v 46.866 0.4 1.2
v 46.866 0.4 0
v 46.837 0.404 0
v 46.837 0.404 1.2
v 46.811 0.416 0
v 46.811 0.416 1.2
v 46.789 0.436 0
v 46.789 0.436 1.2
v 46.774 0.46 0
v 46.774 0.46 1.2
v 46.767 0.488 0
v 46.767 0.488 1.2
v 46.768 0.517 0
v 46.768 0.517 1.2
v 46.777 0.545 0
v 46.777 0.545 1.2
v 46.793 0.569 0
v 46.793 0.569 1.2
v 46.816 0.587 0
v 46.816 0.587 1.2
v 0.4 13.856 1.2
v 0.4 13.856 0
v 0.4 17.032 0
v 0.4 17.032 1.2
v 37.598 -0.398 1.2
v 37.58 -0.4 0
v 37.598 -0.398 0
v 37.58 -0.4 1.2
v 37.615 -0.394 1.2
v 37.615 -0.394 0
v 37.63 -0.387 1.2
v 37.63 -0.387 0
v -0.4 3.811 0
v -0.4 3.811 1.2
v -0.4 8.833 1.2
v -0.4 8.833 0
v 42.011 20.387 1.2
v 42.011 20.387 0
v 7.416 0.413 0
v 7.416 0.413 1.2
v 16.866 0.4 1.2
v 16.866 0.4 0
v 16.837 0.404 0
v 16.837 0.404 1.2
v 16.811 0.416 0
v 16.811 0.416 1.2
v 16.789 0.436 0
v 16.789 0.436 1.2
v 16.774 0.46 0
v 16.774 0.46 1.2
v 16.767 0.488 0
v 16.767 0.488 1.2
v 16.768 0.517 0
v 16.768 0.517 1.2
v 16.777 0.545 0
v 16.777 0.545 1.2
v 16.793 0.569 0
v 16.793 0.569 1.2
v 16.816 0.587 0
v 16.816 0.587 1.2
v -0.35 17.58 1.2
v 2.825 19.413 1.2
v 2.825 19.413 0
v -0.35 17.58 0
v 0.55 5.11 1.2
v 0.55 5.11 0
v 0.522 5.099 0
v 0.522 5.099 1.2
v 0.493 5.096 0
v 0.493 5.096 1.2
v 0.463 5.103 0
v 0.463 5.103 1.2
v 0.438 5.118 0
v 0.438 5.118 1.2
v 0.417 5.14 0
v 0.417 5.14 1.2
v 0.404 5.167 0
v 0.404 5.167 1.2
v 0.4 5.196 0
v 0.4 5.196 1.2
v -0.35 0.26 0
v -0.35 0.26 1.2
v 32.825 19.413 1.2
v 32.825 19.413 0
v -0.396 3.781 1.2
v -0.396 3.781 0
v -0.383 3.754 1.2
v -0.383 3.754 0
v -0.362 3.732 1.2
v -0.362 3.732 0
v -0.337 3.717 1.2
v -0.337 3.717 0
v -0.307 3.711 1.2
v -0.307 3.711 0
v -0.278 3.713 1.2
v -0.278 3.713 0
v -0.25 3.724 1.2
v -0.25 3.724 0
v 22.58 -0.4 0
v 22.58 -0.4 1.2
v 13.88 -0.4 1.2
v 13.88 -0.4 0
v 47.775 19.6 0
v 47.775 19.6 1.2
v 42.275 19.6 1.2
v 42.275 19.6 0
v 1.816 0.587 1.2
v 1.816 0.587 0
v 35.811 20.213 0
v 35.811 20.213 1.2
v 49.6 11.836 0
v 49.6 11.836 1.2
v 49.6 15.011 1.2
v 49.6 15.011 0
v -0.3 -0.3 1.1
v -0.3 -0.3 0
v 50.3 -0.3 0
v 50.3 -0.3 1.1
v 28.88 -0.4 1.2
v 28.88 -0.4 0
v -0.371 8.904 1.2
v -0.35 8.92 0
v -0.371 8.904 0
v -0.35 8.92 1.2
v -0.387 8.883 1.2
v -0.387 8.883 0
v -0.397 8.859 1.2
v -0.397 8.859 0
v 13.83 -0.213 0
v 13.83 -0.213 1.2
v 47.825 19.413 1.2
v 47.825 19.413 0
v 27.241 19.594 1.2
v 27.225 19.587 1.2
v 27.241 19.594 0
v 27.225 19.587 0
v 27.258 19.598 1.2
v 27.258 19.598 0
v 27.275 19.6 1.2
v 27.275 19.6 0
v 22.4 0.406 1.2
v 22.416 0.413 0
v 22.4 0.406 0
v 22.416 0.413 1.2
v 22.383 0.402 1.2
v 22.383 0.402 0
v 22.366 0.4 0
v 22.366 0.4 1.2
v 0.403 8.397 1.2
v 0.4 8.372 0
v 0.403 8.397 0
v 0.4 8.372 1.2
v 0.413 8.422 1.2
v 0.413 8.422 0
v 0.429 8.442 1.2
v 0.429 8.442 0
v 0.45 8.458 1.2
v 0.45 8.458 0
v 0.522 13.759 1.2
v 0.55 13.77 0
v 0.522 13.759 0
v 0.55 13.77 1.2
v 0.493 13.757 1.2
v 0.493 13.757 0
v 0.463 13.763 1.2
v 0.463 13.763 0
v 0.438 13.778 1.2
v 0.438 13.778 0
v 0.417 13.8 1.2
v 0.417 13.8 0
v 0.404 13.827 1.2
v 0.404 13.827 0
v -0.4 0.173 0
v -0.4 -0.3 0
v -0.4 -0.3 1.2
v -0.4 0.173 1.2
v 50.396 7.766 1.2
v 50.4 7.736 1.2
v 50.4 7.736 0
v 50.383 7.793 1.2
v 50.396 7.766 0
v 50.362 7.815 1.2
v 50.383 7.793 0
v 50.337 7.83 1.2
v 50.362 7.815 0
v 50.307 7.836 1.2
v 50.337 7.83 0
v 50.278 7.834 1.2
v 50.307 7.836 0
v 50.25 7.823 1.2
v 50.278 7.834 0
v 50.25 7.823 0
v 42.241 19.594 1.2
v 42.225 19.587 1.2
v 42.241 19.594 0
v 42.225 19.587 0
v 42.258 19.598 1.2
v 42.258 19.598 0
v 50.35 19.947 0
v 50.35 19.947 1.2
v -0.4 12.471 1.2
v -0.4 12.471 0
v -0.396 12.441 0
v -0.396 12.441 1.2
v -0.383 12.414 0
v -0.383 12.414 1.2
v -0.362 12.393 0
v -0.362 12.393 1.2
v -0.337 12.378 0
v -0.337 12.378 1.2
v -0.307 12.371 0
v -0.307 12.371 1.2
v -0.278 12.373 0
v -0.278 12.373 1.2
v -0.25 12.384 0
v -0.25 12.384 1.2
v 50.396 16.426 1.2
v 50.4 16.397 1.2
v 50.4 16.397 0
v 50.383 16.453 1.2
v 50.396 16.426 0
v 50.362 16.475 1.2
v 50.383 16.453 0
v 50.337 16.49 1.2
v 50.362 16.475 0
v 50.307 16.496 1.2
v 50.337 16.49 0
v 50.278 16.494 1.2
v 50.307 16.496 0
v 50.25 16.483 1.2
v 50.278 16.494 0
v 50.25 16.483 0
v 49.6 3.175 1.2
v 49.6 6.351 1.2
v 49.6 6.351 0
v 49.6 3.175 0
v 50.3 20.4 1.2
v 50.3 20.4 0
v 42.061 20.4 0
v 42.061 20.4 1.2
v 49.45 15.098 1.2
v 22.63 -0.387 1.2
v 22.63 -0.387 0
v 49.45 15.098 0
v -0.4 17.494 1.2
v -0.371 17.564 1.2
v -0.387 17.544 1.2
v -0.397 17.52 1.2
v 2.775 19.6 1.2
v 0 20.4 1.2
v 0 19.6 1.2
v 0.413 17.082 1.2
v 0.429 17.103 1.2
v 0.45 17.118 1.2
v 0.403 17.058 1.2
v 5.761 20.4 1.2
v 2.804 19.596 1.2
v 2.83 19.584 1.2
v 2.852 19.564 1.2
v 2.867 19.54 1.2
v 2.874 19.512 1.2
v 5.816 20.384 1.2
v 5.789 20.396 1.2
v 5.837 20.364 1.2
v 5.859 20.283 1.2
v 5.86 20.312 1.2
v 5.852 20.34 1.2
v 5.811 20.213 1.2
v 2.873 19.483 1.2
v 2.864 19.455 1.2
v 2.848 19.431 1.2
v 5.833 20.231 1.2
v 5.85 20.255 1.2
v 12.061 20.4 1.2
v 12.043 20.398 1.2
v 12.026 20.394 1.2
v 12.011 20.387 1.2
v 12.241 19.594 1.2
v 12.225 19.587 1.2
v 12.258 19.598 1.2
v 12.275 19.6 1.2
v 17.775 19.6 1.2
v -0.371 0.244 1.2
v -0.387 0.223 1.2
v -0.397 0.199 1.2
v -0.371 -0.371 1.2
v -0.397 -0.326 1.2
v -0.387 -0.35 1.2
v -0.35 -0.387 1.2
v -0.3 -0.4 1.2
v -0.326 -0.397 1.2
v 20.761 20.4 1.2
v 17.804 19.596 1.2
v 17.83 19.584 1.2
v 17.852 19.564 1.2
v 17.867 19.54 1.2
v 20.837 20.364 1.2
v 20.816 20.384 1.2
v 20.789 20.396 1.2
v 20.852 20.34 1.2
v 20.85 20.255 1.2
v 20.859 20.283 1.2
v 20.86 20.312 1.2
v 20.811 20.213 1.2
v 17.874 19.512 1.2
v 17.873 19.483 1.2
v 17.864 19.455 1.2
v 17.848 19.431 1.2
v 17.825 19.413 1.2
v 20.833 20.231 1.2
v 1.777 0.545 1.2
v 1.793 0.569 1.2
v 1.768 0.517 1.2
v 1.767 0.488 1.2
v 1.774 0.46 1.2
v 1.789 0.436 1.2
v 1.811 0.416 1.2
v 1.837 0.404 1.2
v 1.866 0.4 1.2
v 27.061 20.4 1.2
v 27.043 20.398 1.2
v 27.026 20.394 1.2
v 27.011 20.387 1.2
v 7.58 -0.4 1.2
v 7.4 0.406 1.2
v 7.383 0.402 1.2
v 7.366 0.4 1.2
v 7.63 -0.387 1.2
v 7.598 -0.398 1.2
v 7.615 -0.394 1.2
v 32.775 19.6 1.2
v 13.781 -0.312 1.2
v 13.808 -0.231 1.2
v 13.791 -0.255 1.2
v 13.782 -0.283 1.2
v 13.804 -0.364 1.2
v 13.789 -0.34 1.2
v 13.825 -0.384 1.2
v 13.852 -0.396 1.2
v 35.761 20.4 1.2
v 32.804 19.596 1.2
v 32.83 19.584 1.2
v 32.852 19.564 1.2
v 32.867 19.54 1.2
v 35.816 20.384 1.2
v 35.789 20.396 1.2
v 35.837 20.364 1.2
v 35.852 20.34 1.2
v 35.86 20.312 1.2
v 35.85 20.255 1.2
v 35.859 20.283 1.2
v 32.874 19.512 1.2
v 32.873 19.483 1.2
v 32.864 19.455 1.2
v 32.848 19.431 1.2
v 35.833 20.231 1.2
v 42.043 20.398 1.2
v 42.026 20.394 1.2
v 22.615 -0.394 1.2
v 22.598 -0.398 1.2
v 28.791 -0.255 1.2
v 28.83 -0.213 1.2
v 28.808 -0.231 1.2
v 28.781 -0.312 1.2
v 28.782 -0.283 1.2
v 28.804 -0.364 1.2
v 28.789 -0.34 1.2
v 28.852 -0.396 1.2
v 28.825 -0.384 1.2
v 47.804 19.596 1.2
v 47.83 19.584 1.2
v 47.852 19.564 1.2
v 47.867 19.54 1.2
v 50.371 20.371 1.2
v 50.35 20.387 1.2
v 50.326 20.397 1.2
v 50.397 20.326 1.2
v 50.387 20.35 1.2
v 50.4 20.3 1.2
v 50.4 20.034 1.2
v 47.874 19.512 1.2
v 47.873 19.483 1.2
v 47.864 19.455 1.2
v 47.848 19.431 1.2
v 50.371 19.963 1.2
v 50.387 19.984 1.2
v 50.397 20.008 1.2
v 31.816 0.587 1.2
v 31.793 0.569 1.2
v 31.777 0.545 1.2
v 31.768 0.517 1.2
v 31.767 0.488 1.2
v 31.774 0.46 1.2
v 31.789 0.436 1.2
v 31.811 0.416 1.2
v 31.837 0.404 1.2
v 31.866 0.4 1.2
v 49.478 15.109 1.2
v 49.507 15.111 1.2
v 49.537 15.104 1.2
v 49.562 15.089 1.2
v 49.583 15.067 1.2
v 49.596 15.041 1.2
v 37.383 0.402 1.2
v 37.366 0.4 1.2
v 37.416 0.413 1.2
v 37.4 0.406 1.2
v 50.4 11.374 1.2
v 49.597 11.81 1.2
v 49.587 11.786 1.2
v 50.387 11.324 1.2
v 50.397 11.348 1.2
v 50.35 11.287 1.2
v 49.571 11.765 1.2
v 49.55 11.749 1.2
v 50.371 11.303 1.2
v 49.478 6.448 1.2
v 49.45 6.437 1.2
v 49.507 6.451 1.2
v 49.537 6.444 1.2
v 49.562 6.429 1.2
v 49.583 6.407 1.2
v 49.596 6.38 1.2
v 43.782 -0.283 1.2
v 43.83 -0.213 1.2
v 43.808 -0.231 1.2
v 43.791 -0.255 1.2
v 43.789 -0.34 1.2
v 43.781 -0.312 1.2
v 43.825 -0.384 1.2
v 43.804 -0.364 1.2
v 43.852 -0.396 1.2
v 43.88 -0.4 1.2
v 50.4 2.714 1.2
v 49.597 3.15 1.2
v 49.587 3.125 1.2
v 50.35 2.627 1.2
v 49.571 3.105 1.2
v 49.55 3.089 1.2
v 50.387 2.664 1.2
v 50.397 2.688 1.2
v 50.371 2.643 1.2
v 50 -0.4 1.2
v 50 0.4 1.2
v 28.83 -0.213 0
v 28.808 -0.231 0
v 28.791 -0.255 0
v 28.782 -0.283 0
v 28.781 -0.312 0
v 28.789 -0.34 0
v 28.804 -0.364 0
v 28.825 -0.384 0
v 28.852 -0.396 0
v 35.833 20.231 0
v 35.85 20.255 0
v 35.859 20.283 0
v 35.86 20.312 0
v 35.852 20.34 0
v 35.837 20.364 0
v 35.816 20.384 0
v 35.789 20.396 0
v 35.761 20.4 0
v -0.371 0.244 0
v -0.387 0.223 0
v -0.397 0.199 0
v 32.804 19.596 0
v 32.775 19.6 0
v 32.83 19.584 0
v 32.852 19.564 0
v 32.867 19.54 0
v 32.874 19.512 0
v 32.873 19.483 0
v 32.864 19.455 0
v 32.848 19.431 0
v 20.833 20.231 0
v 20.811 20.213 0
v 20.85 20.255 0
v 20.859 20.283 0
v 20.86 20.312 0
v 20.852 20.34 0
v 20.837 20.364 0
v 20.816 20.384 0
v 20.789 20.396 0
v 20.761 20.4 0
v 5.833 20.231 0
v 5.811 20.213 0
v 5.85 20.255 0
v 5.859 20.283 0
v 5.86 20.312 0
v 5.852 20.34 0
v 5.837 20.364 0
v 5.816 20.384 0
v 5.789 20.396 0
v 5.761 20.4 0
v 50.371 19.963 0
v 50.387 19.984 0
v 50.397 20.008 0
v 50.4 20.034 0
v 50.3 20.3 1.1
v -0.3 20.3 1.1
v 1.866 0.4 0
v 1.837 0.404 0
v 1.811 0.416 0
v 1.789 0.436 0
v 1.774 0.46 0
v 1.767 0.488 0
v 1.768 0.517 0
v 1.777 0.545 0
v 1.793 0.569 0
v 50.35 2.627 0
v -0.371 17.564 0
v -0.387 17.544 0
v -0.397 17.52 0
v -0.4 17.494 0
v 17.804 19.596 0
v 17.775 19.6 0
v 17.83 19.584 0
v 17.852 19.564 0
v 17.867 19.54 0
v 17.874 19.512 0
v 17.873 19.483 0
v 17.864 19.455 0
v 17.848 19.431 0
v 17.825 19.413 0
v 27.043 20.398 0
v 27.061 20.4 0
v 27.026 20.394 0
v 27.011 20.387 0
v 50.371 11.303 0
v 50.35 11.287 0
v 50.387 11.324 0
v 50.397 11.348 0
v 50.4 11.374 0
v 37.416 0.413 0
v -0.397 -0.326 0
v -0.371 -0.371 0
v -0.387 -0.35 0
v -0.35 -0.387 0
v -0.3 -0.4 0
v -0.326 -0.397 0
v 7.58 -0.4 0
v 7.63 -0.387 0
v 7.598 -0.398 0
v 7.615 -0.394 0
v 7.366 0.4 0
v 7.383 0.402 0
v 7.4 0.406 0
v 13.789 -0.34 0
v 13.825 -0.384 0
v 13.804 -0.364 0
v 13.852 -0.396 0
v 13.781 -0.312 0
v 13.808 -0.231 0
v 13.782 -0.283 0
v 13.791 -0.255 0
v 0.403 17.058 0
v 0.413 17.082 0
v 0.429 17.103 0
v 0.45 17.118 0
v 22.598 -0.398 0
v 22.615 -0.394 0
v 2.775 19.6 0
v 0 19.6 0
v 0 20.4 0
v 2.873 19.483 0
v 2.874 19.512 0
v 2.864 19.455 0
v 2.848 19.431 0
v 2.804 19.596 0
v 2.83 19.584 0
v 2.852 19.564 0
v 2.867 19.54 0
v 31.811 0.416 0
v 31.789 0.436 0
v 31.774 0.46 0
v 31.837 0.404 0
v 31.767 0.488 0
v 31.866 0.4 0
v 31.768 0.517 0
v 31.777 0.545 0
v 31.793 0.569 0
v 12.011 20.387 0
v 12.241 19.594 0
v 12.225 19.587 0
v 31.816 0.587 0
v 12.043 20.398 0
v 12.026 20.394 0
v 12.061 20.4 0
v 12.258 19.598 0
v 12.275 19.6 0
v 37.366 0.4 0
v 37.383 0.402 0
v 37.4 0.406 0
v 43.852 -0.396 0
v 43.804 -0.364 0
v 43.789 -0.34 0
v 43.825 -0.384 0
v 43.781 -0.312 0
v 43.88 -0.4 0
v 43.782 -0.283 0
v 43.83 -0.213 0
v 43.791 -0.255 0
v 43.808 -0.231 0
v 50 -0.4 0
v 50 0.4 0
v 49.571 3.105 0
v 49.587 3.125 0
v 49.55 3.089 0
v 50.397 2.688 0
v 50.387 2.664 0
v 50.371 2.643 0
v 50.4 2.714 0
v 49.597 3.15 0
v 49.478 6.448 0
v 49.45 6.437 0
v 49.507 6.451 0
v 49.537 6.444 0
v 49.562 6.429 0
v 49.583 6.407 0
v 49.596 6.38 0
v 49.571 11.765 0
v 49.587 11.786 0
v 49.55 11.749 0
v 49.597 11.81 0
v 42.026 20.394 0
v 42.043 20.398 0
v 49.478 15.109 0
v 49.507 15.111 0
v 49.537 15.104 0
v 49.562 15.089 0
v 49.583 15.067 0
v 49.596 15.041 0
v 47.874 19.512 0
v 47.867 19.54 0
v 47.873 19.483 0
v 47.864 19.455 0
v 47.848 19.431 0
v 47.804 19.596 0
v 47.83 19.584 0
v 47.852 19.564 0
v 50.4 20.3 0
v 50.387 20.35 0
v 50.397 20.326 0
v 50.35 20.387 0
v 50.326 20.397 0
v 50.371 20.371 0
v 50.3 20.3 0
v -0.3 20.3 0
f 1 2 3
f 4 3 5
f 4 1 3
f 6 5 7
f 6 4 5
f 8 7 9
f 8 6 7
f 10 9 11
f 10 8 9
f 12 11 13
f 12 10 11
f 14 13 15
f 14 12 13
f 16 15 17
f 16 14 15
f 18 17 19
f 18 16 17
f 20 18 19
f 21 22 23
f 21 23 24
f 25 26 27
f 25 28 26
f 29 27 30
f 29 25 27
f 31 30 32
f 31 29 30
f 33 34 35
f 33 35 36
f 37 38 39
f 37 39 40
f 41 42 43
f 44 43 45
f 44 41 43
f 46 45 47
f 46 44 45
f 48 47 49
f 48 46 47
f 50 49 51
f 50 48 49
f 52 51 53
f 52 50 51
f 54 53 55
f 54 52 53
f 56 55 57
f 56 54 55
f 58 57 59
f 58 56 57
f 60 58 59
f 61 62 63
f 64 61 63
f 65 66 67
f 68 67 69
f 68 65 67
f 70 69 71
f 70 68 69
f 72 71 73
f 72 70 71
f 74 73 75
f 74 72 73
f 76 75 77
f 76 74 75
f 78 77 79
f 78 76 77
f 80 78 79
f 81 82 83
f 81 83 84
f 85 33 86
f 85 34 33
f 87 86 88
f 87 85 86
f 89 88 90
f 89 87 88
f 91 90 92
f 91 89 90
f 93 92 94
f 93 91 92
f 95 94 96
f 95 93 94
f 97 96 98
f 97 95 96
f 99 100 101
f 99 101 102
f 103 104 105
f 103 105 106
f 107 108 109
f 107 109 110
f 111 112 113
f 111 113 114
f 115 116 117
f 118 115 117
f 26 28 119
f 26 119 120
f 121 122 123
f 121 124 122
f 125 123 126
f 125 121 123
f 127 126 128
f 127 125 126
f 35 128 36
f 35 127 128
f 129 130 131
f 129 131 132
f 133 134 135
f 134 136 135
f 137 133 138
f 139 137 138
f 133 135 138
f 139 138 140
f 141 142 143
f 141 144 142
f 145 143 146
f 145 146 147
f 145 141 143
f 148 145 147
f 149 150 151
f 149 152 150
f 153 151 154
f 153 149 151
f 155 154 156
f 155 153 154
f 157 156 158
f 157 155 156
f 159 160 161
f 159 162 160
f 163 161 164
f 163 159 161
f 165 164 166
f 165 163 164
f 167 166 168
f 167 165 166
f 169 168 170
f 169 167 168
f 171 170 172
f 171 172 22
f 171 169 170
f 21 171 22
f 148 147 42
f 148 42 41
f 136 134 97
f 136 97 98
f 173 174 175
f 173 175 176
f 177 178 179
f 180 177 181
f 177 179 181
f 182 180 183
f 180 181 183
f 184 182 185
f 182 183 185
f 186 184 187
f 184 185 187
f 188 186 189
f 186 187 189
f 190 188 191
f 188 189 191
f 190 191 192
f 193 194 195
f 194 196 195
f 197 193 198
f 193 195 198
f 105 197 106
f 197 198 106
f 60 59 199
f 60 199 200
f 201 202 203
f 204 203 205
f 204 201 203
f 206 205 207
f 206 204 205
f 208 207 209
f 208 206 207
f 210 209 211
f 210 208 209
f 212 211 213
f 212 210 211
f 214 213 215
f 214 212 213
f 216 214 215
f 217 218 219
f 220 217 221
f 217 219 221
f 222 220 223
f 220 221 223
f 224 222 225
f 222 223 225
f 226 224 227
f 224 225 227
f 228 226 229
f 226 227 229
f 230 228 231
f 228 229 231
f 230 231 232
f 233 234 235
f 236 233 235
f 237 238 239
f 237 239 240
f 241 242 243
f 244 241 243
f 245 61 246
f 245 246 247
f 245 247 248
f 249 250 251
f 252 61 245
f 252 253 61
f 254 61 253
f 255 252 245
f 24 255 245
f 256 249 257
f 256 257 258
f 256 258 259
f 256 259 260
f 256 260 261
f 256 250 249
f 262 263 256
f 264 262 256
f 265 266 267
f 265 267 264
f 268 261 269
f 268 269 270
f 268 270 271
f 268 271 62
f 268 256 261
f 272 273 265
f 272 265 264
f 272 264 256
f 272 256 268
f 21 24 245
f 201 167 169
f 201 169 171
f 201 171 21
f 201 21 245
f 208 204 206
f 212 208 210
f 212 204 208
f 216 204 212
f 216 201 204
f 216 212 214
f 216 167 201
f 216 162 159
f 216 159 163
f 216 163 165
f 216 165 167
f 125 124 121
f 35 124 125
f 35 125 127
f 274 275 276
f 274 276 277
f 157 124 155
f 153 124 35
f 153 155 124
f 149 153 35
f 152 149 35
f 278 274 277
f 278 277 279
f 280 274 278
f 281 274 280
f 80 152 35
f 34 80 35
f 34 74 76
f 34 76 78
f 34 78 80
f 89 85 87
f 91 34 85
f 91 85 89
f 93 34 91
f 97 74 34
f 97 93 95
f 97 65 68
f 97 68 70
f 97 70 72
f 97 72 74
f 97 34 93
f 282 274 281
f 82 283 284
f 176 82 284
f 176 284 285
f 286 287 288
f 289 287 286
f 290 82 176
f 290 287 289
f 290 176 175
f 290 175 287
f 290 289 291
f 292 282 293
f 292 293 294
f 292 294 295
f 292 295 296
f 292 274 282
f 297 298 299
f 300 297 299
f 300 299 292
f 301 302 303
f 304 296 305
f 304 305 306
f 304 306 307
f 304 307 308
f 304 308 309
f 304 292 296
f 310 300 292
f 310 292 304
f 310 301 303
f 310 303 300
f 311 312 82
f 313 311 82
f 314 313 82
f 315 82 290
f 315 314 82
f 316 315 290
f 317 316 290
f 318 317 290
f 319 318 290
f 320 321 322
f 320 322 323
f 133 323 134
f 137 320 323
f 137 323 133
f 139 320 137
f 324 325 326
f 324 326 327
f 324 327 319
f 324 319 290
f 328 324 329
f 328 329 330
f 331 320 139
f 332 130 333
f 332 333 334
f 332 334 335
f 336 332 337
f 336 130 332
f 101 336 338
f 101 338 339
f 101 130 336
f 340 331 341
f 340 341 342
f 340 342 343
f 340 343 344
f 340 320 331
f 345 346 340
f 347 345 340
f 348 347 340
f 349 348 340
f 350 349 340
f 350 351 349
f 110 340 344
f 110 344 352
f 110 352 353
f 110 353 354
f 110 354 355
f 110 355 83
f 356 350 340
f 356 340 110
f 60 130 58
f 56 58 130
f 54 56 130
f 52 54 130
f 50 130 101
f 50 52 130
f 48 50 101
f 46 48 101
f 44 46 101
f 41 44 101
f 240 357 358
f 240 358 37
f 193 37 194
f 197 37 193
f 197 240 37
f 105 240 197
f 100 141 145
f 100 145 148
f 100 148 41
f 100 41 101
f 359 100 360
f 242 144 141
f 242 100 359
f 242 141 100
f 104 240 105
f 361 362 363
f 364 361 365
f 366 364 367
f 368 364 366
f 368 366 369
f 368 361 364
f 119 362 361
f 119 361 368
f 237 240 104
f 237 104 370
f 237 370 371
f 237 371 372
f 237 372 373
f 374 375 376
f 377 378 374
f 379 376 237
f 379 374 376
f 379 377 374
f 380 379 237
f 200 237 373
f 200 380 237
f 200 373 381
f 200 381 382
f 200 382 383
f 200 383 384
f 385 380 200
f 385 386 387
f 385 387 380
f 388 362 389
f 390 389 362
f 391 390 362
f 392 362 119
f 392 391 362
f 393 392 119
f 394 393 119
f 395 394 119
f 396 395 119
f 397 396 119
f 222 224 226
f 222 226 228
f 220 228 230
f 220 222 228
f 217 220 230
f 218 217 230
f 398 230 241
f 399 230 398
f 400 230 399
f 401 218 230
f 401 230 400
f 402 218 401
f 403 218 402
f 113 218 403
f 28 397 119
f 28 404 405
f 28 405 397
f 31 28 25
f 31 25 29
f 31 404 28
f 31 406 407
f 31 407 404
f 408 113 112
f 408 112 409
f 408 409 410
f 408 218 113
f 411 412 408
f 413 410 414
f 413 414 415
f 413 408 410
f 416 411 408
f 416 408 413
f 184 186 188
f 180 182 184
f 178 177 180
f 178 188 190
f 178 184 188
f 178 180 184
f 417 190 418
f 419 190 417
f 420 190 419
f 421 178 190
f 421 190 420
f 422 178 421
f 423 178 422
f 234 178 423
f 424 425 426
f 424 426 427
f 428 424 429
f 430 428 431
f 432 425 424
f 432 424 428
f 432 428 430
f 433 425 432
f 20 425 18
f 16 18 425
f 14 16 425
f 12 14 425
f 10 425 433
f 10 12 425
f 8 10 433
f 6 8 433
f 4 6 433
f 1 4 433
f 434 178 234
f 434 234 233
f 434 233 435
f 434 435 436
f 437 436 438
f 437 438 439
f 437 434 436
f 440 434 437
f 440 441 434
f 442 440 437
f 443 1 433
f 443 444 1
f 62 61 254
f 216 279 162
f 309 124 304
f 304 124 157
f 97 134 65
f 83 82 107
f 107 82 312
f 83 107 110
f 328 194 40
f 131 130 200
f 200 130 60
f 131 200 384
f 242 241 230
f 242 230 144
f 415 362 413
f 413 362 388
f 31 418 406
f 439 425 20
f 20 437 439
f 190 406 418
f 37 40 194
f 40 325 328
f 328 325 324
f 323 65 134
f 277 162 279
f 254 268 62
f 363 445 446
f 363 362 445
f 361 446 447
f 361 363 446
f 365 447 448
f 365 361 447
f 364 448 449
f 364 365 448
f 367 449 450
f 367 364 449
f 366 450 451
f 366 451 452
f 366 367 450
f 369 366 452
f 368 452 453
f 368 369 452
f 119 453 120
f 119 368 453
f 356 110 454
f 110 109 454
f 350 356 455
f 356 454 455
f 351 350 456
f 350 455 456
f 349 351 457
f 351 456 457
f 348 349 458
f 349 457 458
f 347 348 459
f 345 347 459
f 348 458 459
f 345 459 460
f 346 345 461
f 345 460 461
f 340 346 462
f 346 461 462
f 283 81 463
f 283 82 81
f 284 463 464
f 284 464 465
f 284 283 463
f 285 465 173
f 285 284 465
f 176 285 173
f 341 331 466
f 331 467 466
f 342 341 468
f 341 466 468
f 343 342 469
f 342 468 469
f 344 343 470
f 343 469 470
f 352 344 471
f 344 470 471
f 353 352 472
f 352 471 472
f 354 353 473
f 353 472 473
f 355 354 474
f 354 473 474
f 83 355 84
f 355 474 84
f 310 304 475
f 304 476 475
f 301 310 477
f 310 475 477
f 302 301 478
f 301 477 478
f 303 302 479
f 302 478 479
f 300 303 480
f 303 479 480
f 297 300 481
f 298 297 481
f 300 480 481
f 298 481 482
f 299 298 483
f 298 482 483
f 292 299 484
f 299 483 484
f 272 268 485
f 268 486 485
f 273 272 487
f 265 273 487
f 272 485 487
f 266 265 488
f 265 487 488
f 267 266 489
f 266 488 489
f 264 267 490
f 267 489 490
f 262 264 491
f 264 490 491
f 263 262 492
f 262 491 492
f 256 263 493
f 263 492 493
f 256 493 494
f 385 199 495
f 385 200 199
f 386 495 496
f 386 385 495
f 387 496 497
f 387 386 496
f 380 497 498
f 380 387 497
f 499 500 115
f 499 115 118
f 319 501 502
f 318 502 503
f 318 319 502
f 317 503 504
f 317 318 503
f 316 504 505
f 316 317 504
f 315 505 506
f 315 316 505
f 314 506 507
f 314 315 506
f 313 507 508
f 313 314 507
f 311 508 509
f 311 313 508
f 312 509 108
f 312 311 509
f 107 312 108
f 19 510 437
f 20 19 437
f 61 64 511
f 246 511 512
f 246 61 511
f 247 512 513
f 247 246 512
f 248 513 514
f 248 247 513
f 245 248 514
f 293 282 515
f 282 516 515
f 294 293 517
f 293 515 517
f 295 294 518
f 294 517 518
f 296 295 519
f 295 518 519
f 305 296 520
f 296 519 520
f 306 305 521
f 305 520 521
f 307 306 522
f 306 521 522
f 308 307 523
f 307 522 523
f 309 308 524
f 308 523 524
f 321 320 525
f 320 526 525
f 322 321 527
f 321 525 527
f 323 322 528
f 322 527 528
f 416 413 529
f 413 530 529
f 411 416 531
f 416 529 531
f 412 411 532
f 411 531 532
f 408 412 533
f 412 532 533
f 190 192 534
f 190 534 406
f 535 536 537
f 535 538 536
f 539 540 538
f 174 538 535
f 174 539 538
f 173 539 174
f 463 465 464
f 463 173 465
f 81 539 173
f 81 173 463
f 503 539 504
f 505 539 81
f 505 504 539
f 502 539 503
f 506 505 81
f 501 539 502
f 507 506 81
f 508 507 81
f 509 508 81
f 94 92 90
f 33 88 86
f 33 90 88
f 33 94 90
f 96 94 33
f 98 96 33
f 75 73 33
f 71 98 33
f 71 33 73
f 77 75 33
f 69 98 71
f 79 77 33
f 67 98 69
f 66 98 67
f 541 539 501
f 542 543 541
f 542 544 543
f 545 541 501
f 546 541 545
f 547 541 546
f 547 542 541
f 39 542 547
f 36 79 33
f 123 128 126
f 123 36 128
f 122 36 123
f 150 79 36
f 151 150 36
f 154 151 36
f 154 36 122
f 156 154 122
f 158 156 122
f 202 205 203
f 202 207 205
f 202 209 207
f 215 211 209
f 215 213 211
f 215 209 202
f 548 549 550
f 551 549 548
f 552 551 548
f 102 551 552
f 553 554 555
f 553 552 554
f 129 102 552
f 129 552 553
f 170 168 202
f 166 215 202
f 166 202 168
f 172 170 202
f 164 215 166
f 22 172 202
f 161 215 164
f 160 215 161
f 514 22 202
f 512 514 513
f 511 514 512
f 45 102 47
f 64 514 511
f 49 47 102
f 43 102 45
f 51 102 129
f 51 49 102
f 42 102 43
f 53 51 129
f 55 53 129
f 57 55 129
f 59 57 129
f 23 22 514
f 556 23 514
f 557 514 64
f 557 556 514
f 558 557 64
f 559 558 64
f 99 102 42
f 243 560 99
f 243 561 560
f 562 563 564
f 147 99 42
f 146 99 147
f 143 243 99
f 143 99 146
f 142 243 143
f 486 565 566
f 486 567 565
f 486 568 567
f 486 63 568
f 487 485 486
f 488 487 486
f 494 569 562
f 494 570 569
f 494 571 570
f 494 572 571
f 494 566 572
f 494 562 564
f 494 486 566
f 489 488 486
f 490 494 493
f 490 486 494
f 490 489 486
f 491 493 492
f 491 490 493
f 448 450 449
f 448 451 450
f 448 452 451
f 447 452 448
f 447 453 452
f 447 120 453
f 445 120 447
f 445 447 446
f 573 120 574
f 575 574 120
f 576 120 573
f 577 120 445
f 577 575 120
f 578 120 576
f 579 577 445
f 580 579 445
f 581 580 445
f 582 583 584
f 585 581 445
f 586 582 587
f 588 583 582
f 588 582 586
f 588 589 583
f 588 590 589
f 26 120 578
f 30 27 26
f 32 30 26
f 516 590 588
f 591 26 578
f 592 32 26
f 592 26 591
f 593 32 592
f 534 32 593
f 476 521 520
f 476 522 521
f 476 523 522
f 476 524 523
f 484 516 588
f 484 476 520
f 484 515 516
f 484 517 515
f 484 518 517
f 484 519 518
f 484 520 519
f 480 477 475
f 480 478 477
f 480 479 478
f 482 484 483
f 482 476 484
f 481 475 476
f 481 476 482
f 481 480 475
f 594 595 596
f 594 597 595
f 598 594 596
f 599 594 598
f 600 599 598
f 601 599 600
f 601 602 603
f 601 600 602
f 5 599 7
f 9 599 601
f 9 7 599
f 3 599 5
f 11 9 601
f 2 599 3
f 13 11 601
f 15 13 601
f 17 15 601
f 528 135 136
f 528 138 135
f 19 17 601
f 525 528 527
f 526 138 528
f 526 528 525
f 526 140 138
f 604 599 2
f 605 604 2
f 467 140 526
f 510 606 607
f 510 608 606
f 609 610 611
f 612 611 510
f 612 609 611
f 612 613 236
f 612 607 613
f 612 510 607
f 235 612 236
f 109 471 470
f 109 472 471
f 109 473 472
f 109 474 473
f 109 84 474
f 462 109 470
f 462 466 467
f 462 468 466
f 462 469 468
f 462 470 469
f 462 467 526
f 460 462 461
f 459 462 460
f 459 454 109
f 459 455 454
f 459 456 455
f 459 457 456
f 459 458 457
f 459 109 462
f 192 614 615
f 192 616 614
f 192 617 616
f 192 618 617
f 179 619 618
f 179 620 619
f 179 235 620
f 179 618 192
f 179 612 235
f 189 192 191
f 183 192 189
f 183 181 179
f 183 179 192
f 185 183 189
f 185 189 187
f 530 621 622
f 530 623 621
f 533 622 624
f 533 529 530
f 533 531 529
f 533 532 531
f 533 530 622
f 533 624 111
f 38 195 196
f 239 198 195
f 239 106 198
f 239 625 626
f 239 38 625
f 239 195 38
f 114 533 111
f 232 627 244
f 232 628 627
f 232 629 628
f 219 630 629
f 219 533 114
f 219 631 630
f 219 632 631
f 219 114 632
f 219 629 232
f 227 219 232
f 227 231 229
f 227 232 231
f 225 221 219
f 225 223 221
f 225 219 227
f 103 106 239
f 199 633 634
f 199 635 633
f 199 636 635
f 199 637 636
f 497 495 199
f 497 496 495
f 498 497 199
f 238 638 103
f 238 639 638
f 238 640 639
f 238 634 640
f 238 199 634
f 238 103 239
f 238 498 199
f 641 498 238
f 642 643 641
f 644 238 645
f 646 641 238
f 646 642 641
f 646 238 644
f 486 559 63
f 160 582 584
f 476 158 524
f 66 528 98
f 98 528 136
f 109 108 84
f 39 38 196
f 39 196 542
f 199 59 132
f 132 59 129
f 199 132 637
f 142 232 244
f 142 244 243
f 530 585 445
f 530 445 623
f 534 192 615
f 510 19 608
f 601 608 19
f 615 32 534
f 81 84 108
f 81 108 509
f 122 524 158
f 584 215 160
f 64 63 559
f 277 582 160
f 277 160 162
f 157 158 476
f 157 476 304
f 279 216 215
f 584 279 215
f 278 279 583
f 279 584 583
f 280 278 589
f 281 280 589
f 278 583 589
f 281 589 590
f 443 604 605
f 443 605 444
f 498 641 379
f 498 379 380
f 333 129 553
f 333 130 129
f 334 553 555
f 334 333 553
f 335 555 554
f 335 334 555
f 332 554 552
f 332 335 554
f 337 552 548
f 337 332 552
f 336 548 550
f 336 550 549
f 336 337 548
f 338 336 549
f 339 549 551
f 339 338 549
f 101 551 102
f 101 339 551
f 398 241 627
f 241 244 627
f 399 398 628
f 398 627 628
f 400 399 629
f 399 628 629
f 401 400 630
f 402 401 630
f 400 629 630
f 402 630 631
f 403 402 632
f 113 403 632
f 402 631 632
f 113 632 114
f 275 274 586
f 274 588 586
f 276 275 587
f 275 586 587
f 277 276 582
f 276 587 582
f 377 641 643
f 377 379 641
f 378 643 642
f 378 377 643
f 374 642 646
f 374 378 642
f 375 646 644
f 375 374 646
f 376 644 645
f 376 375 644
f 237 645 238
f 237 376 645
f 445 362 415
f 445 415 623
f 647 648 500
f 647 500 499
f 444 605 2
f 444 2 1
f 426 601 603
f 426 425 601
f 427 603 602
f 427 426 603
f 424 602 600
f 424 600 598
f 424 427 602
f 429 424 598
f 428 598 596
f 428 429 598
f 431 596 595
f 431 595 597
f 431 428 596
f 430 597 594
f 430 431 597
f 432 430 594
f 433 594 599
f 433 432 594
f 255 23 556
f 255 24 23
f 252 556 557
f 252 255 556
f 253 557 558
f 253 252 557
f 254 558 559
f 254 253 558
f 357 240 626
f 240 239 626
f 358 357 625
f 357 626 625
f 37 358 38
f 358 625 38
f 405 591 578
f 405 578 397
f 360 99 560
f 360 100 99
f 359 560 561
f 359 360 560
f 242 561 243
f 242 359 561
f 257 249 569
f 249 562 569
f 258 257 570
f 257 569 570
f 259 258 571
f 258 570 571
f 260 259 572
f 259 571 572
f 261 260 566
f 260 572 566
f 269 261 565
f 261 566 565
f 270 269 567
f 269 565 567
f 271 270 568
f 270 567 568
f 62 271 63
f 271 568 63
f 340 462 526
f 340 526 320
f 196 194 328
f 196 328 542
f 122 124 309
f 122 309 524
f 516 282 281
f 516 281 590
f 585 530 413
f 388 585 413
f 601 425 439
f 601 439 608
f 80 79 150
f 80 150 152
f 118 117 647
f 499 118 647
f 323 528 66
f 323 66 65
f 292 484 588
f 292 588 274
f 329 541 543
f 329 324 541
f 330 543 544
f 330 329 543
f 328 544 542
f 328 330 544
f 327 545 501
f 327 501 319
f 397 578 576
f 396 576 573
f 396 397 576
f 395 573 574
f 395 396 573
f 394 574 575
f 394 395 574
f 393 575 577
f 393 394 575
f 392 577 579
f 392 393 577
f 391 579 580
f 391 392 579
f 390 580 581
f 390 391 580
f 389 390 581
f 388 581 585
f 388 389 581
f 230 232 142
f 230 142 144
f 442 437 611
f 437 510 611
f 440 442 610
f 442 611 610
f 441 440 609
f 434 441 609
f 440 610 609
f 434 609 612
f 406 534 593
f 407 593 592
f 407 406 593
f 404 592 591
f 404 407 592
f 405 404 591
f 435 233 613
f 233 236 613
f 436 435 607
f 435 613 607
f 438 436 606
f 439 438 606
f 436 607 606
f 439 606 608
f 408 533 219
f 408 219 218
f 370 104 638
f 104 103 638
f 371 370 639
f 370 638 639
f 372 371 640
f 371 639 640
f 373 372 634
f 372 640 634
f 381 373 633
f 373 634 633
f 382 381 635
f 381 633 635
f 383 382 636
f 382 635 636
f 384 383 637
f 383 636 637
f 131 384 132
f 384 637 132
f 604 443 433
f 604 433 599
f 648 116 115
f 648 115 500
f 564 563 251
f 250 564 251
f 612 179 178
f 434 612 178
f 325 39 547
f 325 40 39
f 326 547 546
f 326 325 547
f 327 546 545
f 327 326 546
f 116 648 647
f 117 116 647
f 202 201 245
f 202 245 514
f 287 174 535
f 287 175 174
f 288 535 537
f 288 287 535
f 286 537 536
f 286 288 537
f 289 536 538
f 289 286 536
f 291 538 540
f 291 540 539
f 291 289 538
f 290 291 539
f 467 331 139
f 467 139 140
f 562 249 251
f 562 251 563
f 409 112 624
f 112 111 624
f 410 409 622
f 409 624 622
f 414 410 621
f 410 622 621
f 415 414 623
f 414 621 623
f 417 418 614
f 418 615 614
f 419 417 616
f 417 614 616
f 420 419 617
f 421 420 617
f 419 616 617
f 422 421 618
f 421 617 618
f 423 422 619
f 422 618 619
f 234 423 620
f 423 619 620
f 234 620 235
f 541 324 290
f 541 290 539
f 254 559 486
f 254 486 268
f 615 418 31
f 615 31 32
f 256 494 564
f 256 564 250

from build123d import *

# Parameters (mm, degrees)
F5_W     = 62.8235205077
F5_H     = 37.2700802982
F6_DEPTH = 25
F8_W     = 50.6
F8_H     = 20.6
F9_DEPTH = 1.1
F10_R    = 0.1


with BuildPart() as f4:
    # F4: sweep along a path in F1
    with BuildLine(Plane.XY) as f4_path:
        Line((0, 20), (4.6410161514, 20))
        Line((4.6410161514, 20), (0, 17.3205080757))
        Line((0, 17.3205080757), (0, 12.9903810568))
        Line((0, 12.9903810568), (12.1410161514, 20))
        Line((12.1410161514, 20), (19.6410161514, 20))
        Line((19.6410161514, 20), (0, 8.6602540378))
        Line((0, 8.6602540378), (0, 4.3301270189))
        Line((0, 4.3301270189), (27.1410161514, 20))
        Line((27.1410161514, 20), (34.6410161514, 20))
        Line((34.6410161514, 20), (0, 0))
        Line((0, 0), (7.5, 0))
        Line((7.5, 0), (42.1410161514, 20))
        Line((42.1410161514, 20), (49.6410161514, 20))
        Line((49.6410161514, 20), (15, 0))
        Line((15, 0), (22.5, 0))
        Line((22.5, 0), (50, 15.8771324027))
        Line((50, 15.8771324027), (50, 11.5470053838))
        Line((50, 11.5470053838), (30, 0))
        Line((30, 0), (37.5, 0))
        Line((37.5, 0), (50, 7.2168783649))
        Line((50, 7.2168783649), (50, 2.8867513459))
        Line((50, 2.8867513459), (45, 0))
        Line((45, 0), (50, 0))
    # F3 (on line) → F4 (sweep)
    with BuildSketch(Plane.YZ):
        Polygon((19.6, 0), (20, 0), (20.4, 0), (20.4, 1.2), (20, 1.2), (19.6, 1.2), align=None)
    sweep(path=f4_path.line, transition=Transition.RIGHT)


with BuildPart() as f6:
    # F5 (on Top) → F6 (new body)
    with BuildSketch(Plane.XY):
        with Locations((25.02031927, 9.5404535532)):
            Rectangle(F5_W, F5_H)
        Polygon((-0.4, 3.6373066959), (-0.4, 8.8911941455), (-0.4, 20.4), (0, 20.4), (6.1338364744, 20.4), (50.4, 20.4), (50.4, 16.5699527257), (50.4, 11.3160652761), (50.4, -0.4), (37.607179677, -0.4), (28.507179677, -0.4), (-0.4, -0.4), align=None, mode=Mode.SUBTRACT)
    extrude(amount=F6_DEPTH)


with BuildPart() as f4_1:
    add(f4.part)

    # F7: cut F6
    add(f6.part, mode=Mode.SUBTRACT)

    # F10
    f10_edges = [f4_1.edges().sort_by_distance(p)[0] for p in [
        (-0.4, 17.551448, 0.6),
        (3.148196, 19.6, 0.6),
        (6.133836, 20.4, 0.6),
        (0.4, 17.089568, 0.6),
        (0.4, 13.683201, 0.6),
        (-0.4, 12.297561, 0.6),
        (12.248196, 19.6, 0.6),
        (12.033836, 20.4, 0.6),
        (18.148196, 19.6, 0.6),
        (21.133836, 20.4, 0.6),
        (27.033836, 20.4, 0.6),
        (-0.4, 8.891194, 0.6),
        (0.4, 8.429314, 0.6),
        (0.4, 5.022947, 0.6),
        (-0.4, 3.637307, 0.6),
        (27.248196, 19.6, 0.6),
        (33.148196, 19.6, 0.6),
        (36.133836, 20.4, 0.6),
        (42.033836, 20.4, 0.6),
        (-0.4, 0.23094, 0.6),
        (1.49282, 0.4, 0.6),
        (-0.4, -0.4, 0.6),
        (7.39282, 0.4, 0.6),
        (7.60718, -0.4, 0.6),
        (42.248196, 19.6, 0.6),
        (48.148196, 19.6, 0.6),
        (50.4, 20.4, 0.6),
        (50.4, 19.976319, 0.6),
        (50.4, 16.569953, 0.6),
        (49.6, 15.184312, 0.6),
        (49.6, 11.777945, 0.6),
        (50.4, 11.316065, 0.6),
        (28.50718, -0.4, 0.6),
        (31.49282, 0.4, 0.6),
        (22.60718, -0.4, 0.6),
        (13.50718, -0.4, 0.6),
        (16.49282, 0.4, 0.6),
        (37.39282, 0.4, 0.6),
        (22.39282, 0.4, 0.6),
        (50.4, 7.909699, 0.6),
        (49.6, 6.524058, 0.6),
        (37.60718, -0.4, 0.6),
        (43.50718, -0.4, 0.6),
        (50.4, 2.655811, 0.6),
        (46.49282, 0.4, 0.6),
        (49.6, 3.117691, 0.6),
    ]]
    fillet(f10_edges, radius=F10_R)


with BuildPart() as f9:
    # F8 (on Top) → F9 (new body)
    with BuildSketch(Plane.XY):
        with Locations((25, 10)):
            Rectangle(F8_W, F8_H)
    extrude(amount=F9_DEPTH)


solid = Compound([f4_1.part, f9.part])
